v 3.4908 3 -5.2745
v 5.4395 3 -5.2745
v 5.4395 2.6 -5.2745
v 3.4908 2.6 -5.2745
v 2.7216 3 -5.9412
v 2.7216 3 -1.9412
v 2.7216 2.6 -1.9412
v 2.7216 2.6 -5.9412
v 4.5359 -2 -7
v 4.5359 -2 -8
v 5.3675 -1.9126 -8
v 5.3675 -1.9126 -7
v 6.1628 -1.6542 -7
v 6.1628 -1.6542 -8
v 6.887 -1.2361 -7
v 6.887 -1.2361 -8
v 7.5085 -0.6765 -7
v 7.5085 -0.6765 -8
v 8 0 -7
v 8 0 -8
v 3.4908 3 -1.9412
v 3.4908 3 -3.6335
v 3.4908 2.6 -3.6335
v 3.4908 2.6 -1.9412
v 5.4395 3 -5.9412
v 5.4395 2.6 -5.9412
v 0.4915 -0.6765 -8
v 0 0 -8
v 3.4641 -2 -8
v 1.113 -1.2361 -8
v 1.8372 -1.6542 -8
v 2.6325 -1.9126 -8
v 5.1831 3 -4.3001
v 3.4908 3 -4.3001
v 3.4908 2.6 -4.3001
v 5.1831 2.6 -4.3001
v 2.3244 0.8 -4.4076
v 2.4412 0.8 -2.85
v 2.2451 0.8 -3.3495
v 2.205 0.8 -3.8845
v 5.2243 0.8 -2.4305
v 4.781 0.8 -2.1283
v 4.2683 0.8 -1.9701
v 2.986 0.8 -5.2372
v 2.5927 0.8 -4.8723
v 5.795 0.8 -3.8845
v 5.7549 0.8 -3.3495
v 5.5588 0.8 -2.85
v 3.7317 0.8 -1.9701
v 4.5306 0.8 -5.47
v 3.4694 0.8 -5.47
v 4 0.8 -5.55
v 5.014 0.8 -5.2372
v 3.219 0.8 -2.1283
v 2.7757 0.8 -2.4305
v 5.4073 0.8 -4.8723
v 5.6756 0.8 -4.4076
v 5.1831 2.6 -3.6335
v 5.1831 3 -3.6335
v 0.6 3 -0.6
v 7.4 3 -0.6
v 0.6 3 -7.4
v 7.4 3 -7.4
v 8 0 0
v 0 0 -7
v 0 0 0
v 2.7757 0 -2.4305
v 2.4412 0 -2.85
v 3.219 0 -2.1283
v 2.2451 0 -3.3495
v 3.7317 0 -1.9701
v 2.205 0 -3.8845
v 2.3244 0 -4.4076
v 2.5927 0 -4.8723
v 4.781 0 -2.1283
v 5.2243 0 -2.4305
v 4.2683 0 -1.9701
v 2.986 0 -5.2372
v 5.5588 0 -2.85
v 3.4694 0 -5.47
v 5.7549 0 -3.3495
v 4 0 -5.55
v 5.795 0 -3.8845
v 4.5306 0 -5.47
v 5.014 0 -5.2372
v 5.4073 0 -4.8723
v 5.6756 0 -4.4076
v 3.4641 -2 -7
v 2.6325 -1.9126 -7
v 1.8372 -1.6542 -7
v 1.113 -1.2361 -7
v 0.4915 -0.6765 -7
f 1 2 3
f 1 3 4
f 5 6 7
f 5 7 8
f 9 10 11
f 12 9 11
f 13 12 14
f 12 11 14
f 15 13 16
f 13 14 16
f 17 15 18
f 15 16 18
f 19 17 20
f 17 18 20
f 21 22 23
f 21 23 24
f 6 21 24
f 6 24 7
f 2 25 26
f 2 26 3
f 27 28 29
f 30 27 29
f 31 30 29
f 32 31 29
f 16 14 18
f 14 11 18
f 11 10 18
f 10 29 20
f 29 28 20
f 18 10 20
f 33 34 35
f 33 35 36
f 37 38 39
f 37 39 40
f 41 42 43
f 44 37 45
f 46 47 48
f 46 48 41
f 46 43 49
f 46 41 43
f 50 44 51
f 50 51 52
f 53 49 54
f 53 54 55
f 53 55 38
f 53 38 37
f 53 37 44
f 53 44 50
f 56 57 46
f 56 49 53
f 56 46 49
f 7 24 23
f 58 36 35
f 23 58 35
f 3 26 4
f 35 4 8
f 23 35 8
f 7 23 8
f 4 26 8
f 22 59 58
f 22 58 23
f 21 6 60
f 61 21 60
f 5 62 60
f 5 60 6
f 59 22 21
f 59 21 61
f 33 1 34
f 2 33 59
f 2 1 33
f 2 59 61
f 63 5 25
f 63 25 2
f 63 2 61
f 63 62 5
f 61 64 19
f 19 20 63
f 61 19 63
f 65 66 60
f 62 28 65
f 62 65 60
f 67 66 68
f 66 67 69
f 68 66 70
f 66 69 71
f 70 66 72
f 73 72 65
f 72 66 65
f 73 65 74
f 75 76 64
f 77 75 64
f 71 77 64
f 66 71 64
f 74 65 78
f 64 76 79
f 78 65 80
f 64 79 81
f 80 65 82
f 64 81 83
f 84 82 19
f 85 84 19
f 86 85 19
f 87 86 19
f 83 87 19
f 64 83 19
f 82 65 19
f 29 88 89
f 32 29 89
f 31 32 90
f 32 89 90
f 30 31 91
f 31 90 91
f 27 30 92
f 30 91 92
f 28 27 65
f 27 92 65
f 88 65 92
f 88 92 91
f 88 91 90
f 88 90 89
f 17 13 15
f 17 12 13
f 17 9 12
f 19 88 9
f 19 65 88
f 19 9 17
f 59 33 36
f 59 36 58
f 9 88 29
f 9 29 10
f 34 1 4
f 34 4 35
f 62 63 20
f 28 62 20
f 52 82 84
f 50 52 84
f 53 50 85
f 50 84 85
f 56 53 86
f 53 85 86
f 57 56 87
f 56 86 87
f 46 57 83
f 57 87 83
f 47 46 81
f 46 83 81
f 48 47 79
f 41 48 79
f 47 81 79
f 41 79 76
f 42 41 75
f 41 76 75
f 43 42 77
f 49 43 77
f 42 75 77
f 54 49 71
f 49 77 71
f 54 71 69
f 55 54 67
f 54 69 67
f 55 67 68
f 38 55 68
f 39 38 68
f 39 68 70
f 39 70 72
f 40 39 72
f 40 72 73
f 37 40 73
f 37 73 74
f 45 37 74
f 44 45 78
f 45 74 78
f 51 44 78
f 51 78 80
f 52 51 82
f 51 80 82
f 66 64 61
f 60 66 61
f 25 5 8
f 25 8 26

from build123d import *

# Parameters (mm, degrees)
SKETCH1_W               = 8
SKETCH1_H               = 8
BOSS_EXTRUDE1_DEPTH     = 3
CUT_EXTRUDE1_DEPTH      = 12.704699911
CUT_EXTRUDE1_DEPTH_BACK = 12.704699911
CUT_EXTRUDE2_DEPTH      = 11
SKETCH4_R               = 1.8
CUT_EXTRUDE3_DEPTH      = 0.8
SKETCH5_W               = 8
SKETCH5_H               = 1
BOSS_EXTRUDE2_DEPTH     = 2
FILLET1_R               = 4
CUT_EXTRUDE4_DEPTH      = 0.4


with BuildPart() as part:
    # Sketch1 → Boss-Extrude1 (new body)
    with BuildSketch(Plane(origin=(0, 0, 0), x_dir=(1, 0, 0), z_dir=(0, 1, 0))):
        with Locations((4, 4)):
            Rectangle(SKETCH1_W, SKETCH1_H)
    extrude(amount=BOSS_EXTRUDE1_DEPTH)

    # Sketch2 → Cut-Extrude1 (cut, two sides: drawn at the far end of the back side and taken through both)
    with BuildSketch(Plane.XY.offset(-CUT_EXTRUDE1_DEPTH_BACK)):
        Polygon((0, 0), (0.6, 3), (0, 3), align=None)
        Polygon((8, 0), (7.4, 3), (8, 3), align=None)
    extrude(amount=CUT_EXTRUDE1_DEPTH + CUT_EXTRUDE1_DEPTH_BACK, mode=Mode.SUBTRACT)

    # Sketch3 → Cut-Extrude2 (cut)
    with BuildSketch(Plane(origin=(0, 0, 0), x_dir=(0, 0, -1), z_dir=(1, 0, 0))):
        Polygon((0, 0), (0.6, 3), (0, 3), align=None)
        Polygon((8, 3), (7.4, 3), (8, 0), align=None)
    extrude(amount=CUT_EXTRUDE2_DEPTH, mode=Mode.SUBTRACT)

    # Sketch4 → Cut-Extrude3 (cut)
    with BuildSketch(Plane.XZ):
        with Locations(Location((4, -3.75, 0), (0, 0, 270))):
            Circle(SKETCH4_R)
    extrude(amount=-CUT_EXTRUDE3_DEPTH, mode=Mode.SUBTRACT)

    # Sketch5 → Boss-Extrude2 (add)
    with BuildSketch(Plane.XZ):
        with Locations((4, -7.5)):
            Rectangle(SKETCH5_W, SKETCH5_H)
    extrude(amount=BOSS_EXTRUDE2_DEPTH)

    # Fillet1
    # the kernel refuses this fillet: 4 mm, written as the material it takes off along each edge
    with BuildSketch(Plane(origin=(8, -2, -16.660254038), x_dir=(0, 1, 0), z_dir=(0, 0, 1)), Plane(origin=(0, -2, 1.660254038), x_dir=(0, 1, 0), z_dir=(0, 0, -1))) as fillet1_piece_1:
        with BuildLine():
            CenterArc((4, 3.464101615), FILLET1_R, 180, 60)
            Line((0, 3.464101615), (-0.08, 3.464101615))
            Line((-0.08, 3.464101615), (-0.08, 0))
            Line((-0.08, 0), (0, -0.08))
            ThreePointArc((0, -0.08), (1, -0.08), (1.96, -0.069282032))
            Line((1.96, -0.069282032), (2, 0))
        make_face()
    extrude(amount=18.320508076, mode=Mode.SUBTRACT)

    # Sketch6 → Cut-Extrude4 (cut)
    with BuildSketch(Plane(origin=(0, 3, 0), x_dir=(1, 0, 0), z_dir=(0, 1, 0))):
        Polygon((2.721575188, 1.941169366), (2.721575188, 5.941169366), (5.439523906, 5.941169366), (5.439523906, 5.2745027), (3.490805957, 5.2745027), (3.490805957, 4.300143725), (5.18311365, 4.300143725), (5.18311365, 3.633477059), (3.490805957, 3.633477059), (3.490805957, 1.941169366), align=None)
    extrude(amount=-CUT_EXTRUDE4_DEPTH, mode=Mode.SUBTRACT)


solid = part.part
